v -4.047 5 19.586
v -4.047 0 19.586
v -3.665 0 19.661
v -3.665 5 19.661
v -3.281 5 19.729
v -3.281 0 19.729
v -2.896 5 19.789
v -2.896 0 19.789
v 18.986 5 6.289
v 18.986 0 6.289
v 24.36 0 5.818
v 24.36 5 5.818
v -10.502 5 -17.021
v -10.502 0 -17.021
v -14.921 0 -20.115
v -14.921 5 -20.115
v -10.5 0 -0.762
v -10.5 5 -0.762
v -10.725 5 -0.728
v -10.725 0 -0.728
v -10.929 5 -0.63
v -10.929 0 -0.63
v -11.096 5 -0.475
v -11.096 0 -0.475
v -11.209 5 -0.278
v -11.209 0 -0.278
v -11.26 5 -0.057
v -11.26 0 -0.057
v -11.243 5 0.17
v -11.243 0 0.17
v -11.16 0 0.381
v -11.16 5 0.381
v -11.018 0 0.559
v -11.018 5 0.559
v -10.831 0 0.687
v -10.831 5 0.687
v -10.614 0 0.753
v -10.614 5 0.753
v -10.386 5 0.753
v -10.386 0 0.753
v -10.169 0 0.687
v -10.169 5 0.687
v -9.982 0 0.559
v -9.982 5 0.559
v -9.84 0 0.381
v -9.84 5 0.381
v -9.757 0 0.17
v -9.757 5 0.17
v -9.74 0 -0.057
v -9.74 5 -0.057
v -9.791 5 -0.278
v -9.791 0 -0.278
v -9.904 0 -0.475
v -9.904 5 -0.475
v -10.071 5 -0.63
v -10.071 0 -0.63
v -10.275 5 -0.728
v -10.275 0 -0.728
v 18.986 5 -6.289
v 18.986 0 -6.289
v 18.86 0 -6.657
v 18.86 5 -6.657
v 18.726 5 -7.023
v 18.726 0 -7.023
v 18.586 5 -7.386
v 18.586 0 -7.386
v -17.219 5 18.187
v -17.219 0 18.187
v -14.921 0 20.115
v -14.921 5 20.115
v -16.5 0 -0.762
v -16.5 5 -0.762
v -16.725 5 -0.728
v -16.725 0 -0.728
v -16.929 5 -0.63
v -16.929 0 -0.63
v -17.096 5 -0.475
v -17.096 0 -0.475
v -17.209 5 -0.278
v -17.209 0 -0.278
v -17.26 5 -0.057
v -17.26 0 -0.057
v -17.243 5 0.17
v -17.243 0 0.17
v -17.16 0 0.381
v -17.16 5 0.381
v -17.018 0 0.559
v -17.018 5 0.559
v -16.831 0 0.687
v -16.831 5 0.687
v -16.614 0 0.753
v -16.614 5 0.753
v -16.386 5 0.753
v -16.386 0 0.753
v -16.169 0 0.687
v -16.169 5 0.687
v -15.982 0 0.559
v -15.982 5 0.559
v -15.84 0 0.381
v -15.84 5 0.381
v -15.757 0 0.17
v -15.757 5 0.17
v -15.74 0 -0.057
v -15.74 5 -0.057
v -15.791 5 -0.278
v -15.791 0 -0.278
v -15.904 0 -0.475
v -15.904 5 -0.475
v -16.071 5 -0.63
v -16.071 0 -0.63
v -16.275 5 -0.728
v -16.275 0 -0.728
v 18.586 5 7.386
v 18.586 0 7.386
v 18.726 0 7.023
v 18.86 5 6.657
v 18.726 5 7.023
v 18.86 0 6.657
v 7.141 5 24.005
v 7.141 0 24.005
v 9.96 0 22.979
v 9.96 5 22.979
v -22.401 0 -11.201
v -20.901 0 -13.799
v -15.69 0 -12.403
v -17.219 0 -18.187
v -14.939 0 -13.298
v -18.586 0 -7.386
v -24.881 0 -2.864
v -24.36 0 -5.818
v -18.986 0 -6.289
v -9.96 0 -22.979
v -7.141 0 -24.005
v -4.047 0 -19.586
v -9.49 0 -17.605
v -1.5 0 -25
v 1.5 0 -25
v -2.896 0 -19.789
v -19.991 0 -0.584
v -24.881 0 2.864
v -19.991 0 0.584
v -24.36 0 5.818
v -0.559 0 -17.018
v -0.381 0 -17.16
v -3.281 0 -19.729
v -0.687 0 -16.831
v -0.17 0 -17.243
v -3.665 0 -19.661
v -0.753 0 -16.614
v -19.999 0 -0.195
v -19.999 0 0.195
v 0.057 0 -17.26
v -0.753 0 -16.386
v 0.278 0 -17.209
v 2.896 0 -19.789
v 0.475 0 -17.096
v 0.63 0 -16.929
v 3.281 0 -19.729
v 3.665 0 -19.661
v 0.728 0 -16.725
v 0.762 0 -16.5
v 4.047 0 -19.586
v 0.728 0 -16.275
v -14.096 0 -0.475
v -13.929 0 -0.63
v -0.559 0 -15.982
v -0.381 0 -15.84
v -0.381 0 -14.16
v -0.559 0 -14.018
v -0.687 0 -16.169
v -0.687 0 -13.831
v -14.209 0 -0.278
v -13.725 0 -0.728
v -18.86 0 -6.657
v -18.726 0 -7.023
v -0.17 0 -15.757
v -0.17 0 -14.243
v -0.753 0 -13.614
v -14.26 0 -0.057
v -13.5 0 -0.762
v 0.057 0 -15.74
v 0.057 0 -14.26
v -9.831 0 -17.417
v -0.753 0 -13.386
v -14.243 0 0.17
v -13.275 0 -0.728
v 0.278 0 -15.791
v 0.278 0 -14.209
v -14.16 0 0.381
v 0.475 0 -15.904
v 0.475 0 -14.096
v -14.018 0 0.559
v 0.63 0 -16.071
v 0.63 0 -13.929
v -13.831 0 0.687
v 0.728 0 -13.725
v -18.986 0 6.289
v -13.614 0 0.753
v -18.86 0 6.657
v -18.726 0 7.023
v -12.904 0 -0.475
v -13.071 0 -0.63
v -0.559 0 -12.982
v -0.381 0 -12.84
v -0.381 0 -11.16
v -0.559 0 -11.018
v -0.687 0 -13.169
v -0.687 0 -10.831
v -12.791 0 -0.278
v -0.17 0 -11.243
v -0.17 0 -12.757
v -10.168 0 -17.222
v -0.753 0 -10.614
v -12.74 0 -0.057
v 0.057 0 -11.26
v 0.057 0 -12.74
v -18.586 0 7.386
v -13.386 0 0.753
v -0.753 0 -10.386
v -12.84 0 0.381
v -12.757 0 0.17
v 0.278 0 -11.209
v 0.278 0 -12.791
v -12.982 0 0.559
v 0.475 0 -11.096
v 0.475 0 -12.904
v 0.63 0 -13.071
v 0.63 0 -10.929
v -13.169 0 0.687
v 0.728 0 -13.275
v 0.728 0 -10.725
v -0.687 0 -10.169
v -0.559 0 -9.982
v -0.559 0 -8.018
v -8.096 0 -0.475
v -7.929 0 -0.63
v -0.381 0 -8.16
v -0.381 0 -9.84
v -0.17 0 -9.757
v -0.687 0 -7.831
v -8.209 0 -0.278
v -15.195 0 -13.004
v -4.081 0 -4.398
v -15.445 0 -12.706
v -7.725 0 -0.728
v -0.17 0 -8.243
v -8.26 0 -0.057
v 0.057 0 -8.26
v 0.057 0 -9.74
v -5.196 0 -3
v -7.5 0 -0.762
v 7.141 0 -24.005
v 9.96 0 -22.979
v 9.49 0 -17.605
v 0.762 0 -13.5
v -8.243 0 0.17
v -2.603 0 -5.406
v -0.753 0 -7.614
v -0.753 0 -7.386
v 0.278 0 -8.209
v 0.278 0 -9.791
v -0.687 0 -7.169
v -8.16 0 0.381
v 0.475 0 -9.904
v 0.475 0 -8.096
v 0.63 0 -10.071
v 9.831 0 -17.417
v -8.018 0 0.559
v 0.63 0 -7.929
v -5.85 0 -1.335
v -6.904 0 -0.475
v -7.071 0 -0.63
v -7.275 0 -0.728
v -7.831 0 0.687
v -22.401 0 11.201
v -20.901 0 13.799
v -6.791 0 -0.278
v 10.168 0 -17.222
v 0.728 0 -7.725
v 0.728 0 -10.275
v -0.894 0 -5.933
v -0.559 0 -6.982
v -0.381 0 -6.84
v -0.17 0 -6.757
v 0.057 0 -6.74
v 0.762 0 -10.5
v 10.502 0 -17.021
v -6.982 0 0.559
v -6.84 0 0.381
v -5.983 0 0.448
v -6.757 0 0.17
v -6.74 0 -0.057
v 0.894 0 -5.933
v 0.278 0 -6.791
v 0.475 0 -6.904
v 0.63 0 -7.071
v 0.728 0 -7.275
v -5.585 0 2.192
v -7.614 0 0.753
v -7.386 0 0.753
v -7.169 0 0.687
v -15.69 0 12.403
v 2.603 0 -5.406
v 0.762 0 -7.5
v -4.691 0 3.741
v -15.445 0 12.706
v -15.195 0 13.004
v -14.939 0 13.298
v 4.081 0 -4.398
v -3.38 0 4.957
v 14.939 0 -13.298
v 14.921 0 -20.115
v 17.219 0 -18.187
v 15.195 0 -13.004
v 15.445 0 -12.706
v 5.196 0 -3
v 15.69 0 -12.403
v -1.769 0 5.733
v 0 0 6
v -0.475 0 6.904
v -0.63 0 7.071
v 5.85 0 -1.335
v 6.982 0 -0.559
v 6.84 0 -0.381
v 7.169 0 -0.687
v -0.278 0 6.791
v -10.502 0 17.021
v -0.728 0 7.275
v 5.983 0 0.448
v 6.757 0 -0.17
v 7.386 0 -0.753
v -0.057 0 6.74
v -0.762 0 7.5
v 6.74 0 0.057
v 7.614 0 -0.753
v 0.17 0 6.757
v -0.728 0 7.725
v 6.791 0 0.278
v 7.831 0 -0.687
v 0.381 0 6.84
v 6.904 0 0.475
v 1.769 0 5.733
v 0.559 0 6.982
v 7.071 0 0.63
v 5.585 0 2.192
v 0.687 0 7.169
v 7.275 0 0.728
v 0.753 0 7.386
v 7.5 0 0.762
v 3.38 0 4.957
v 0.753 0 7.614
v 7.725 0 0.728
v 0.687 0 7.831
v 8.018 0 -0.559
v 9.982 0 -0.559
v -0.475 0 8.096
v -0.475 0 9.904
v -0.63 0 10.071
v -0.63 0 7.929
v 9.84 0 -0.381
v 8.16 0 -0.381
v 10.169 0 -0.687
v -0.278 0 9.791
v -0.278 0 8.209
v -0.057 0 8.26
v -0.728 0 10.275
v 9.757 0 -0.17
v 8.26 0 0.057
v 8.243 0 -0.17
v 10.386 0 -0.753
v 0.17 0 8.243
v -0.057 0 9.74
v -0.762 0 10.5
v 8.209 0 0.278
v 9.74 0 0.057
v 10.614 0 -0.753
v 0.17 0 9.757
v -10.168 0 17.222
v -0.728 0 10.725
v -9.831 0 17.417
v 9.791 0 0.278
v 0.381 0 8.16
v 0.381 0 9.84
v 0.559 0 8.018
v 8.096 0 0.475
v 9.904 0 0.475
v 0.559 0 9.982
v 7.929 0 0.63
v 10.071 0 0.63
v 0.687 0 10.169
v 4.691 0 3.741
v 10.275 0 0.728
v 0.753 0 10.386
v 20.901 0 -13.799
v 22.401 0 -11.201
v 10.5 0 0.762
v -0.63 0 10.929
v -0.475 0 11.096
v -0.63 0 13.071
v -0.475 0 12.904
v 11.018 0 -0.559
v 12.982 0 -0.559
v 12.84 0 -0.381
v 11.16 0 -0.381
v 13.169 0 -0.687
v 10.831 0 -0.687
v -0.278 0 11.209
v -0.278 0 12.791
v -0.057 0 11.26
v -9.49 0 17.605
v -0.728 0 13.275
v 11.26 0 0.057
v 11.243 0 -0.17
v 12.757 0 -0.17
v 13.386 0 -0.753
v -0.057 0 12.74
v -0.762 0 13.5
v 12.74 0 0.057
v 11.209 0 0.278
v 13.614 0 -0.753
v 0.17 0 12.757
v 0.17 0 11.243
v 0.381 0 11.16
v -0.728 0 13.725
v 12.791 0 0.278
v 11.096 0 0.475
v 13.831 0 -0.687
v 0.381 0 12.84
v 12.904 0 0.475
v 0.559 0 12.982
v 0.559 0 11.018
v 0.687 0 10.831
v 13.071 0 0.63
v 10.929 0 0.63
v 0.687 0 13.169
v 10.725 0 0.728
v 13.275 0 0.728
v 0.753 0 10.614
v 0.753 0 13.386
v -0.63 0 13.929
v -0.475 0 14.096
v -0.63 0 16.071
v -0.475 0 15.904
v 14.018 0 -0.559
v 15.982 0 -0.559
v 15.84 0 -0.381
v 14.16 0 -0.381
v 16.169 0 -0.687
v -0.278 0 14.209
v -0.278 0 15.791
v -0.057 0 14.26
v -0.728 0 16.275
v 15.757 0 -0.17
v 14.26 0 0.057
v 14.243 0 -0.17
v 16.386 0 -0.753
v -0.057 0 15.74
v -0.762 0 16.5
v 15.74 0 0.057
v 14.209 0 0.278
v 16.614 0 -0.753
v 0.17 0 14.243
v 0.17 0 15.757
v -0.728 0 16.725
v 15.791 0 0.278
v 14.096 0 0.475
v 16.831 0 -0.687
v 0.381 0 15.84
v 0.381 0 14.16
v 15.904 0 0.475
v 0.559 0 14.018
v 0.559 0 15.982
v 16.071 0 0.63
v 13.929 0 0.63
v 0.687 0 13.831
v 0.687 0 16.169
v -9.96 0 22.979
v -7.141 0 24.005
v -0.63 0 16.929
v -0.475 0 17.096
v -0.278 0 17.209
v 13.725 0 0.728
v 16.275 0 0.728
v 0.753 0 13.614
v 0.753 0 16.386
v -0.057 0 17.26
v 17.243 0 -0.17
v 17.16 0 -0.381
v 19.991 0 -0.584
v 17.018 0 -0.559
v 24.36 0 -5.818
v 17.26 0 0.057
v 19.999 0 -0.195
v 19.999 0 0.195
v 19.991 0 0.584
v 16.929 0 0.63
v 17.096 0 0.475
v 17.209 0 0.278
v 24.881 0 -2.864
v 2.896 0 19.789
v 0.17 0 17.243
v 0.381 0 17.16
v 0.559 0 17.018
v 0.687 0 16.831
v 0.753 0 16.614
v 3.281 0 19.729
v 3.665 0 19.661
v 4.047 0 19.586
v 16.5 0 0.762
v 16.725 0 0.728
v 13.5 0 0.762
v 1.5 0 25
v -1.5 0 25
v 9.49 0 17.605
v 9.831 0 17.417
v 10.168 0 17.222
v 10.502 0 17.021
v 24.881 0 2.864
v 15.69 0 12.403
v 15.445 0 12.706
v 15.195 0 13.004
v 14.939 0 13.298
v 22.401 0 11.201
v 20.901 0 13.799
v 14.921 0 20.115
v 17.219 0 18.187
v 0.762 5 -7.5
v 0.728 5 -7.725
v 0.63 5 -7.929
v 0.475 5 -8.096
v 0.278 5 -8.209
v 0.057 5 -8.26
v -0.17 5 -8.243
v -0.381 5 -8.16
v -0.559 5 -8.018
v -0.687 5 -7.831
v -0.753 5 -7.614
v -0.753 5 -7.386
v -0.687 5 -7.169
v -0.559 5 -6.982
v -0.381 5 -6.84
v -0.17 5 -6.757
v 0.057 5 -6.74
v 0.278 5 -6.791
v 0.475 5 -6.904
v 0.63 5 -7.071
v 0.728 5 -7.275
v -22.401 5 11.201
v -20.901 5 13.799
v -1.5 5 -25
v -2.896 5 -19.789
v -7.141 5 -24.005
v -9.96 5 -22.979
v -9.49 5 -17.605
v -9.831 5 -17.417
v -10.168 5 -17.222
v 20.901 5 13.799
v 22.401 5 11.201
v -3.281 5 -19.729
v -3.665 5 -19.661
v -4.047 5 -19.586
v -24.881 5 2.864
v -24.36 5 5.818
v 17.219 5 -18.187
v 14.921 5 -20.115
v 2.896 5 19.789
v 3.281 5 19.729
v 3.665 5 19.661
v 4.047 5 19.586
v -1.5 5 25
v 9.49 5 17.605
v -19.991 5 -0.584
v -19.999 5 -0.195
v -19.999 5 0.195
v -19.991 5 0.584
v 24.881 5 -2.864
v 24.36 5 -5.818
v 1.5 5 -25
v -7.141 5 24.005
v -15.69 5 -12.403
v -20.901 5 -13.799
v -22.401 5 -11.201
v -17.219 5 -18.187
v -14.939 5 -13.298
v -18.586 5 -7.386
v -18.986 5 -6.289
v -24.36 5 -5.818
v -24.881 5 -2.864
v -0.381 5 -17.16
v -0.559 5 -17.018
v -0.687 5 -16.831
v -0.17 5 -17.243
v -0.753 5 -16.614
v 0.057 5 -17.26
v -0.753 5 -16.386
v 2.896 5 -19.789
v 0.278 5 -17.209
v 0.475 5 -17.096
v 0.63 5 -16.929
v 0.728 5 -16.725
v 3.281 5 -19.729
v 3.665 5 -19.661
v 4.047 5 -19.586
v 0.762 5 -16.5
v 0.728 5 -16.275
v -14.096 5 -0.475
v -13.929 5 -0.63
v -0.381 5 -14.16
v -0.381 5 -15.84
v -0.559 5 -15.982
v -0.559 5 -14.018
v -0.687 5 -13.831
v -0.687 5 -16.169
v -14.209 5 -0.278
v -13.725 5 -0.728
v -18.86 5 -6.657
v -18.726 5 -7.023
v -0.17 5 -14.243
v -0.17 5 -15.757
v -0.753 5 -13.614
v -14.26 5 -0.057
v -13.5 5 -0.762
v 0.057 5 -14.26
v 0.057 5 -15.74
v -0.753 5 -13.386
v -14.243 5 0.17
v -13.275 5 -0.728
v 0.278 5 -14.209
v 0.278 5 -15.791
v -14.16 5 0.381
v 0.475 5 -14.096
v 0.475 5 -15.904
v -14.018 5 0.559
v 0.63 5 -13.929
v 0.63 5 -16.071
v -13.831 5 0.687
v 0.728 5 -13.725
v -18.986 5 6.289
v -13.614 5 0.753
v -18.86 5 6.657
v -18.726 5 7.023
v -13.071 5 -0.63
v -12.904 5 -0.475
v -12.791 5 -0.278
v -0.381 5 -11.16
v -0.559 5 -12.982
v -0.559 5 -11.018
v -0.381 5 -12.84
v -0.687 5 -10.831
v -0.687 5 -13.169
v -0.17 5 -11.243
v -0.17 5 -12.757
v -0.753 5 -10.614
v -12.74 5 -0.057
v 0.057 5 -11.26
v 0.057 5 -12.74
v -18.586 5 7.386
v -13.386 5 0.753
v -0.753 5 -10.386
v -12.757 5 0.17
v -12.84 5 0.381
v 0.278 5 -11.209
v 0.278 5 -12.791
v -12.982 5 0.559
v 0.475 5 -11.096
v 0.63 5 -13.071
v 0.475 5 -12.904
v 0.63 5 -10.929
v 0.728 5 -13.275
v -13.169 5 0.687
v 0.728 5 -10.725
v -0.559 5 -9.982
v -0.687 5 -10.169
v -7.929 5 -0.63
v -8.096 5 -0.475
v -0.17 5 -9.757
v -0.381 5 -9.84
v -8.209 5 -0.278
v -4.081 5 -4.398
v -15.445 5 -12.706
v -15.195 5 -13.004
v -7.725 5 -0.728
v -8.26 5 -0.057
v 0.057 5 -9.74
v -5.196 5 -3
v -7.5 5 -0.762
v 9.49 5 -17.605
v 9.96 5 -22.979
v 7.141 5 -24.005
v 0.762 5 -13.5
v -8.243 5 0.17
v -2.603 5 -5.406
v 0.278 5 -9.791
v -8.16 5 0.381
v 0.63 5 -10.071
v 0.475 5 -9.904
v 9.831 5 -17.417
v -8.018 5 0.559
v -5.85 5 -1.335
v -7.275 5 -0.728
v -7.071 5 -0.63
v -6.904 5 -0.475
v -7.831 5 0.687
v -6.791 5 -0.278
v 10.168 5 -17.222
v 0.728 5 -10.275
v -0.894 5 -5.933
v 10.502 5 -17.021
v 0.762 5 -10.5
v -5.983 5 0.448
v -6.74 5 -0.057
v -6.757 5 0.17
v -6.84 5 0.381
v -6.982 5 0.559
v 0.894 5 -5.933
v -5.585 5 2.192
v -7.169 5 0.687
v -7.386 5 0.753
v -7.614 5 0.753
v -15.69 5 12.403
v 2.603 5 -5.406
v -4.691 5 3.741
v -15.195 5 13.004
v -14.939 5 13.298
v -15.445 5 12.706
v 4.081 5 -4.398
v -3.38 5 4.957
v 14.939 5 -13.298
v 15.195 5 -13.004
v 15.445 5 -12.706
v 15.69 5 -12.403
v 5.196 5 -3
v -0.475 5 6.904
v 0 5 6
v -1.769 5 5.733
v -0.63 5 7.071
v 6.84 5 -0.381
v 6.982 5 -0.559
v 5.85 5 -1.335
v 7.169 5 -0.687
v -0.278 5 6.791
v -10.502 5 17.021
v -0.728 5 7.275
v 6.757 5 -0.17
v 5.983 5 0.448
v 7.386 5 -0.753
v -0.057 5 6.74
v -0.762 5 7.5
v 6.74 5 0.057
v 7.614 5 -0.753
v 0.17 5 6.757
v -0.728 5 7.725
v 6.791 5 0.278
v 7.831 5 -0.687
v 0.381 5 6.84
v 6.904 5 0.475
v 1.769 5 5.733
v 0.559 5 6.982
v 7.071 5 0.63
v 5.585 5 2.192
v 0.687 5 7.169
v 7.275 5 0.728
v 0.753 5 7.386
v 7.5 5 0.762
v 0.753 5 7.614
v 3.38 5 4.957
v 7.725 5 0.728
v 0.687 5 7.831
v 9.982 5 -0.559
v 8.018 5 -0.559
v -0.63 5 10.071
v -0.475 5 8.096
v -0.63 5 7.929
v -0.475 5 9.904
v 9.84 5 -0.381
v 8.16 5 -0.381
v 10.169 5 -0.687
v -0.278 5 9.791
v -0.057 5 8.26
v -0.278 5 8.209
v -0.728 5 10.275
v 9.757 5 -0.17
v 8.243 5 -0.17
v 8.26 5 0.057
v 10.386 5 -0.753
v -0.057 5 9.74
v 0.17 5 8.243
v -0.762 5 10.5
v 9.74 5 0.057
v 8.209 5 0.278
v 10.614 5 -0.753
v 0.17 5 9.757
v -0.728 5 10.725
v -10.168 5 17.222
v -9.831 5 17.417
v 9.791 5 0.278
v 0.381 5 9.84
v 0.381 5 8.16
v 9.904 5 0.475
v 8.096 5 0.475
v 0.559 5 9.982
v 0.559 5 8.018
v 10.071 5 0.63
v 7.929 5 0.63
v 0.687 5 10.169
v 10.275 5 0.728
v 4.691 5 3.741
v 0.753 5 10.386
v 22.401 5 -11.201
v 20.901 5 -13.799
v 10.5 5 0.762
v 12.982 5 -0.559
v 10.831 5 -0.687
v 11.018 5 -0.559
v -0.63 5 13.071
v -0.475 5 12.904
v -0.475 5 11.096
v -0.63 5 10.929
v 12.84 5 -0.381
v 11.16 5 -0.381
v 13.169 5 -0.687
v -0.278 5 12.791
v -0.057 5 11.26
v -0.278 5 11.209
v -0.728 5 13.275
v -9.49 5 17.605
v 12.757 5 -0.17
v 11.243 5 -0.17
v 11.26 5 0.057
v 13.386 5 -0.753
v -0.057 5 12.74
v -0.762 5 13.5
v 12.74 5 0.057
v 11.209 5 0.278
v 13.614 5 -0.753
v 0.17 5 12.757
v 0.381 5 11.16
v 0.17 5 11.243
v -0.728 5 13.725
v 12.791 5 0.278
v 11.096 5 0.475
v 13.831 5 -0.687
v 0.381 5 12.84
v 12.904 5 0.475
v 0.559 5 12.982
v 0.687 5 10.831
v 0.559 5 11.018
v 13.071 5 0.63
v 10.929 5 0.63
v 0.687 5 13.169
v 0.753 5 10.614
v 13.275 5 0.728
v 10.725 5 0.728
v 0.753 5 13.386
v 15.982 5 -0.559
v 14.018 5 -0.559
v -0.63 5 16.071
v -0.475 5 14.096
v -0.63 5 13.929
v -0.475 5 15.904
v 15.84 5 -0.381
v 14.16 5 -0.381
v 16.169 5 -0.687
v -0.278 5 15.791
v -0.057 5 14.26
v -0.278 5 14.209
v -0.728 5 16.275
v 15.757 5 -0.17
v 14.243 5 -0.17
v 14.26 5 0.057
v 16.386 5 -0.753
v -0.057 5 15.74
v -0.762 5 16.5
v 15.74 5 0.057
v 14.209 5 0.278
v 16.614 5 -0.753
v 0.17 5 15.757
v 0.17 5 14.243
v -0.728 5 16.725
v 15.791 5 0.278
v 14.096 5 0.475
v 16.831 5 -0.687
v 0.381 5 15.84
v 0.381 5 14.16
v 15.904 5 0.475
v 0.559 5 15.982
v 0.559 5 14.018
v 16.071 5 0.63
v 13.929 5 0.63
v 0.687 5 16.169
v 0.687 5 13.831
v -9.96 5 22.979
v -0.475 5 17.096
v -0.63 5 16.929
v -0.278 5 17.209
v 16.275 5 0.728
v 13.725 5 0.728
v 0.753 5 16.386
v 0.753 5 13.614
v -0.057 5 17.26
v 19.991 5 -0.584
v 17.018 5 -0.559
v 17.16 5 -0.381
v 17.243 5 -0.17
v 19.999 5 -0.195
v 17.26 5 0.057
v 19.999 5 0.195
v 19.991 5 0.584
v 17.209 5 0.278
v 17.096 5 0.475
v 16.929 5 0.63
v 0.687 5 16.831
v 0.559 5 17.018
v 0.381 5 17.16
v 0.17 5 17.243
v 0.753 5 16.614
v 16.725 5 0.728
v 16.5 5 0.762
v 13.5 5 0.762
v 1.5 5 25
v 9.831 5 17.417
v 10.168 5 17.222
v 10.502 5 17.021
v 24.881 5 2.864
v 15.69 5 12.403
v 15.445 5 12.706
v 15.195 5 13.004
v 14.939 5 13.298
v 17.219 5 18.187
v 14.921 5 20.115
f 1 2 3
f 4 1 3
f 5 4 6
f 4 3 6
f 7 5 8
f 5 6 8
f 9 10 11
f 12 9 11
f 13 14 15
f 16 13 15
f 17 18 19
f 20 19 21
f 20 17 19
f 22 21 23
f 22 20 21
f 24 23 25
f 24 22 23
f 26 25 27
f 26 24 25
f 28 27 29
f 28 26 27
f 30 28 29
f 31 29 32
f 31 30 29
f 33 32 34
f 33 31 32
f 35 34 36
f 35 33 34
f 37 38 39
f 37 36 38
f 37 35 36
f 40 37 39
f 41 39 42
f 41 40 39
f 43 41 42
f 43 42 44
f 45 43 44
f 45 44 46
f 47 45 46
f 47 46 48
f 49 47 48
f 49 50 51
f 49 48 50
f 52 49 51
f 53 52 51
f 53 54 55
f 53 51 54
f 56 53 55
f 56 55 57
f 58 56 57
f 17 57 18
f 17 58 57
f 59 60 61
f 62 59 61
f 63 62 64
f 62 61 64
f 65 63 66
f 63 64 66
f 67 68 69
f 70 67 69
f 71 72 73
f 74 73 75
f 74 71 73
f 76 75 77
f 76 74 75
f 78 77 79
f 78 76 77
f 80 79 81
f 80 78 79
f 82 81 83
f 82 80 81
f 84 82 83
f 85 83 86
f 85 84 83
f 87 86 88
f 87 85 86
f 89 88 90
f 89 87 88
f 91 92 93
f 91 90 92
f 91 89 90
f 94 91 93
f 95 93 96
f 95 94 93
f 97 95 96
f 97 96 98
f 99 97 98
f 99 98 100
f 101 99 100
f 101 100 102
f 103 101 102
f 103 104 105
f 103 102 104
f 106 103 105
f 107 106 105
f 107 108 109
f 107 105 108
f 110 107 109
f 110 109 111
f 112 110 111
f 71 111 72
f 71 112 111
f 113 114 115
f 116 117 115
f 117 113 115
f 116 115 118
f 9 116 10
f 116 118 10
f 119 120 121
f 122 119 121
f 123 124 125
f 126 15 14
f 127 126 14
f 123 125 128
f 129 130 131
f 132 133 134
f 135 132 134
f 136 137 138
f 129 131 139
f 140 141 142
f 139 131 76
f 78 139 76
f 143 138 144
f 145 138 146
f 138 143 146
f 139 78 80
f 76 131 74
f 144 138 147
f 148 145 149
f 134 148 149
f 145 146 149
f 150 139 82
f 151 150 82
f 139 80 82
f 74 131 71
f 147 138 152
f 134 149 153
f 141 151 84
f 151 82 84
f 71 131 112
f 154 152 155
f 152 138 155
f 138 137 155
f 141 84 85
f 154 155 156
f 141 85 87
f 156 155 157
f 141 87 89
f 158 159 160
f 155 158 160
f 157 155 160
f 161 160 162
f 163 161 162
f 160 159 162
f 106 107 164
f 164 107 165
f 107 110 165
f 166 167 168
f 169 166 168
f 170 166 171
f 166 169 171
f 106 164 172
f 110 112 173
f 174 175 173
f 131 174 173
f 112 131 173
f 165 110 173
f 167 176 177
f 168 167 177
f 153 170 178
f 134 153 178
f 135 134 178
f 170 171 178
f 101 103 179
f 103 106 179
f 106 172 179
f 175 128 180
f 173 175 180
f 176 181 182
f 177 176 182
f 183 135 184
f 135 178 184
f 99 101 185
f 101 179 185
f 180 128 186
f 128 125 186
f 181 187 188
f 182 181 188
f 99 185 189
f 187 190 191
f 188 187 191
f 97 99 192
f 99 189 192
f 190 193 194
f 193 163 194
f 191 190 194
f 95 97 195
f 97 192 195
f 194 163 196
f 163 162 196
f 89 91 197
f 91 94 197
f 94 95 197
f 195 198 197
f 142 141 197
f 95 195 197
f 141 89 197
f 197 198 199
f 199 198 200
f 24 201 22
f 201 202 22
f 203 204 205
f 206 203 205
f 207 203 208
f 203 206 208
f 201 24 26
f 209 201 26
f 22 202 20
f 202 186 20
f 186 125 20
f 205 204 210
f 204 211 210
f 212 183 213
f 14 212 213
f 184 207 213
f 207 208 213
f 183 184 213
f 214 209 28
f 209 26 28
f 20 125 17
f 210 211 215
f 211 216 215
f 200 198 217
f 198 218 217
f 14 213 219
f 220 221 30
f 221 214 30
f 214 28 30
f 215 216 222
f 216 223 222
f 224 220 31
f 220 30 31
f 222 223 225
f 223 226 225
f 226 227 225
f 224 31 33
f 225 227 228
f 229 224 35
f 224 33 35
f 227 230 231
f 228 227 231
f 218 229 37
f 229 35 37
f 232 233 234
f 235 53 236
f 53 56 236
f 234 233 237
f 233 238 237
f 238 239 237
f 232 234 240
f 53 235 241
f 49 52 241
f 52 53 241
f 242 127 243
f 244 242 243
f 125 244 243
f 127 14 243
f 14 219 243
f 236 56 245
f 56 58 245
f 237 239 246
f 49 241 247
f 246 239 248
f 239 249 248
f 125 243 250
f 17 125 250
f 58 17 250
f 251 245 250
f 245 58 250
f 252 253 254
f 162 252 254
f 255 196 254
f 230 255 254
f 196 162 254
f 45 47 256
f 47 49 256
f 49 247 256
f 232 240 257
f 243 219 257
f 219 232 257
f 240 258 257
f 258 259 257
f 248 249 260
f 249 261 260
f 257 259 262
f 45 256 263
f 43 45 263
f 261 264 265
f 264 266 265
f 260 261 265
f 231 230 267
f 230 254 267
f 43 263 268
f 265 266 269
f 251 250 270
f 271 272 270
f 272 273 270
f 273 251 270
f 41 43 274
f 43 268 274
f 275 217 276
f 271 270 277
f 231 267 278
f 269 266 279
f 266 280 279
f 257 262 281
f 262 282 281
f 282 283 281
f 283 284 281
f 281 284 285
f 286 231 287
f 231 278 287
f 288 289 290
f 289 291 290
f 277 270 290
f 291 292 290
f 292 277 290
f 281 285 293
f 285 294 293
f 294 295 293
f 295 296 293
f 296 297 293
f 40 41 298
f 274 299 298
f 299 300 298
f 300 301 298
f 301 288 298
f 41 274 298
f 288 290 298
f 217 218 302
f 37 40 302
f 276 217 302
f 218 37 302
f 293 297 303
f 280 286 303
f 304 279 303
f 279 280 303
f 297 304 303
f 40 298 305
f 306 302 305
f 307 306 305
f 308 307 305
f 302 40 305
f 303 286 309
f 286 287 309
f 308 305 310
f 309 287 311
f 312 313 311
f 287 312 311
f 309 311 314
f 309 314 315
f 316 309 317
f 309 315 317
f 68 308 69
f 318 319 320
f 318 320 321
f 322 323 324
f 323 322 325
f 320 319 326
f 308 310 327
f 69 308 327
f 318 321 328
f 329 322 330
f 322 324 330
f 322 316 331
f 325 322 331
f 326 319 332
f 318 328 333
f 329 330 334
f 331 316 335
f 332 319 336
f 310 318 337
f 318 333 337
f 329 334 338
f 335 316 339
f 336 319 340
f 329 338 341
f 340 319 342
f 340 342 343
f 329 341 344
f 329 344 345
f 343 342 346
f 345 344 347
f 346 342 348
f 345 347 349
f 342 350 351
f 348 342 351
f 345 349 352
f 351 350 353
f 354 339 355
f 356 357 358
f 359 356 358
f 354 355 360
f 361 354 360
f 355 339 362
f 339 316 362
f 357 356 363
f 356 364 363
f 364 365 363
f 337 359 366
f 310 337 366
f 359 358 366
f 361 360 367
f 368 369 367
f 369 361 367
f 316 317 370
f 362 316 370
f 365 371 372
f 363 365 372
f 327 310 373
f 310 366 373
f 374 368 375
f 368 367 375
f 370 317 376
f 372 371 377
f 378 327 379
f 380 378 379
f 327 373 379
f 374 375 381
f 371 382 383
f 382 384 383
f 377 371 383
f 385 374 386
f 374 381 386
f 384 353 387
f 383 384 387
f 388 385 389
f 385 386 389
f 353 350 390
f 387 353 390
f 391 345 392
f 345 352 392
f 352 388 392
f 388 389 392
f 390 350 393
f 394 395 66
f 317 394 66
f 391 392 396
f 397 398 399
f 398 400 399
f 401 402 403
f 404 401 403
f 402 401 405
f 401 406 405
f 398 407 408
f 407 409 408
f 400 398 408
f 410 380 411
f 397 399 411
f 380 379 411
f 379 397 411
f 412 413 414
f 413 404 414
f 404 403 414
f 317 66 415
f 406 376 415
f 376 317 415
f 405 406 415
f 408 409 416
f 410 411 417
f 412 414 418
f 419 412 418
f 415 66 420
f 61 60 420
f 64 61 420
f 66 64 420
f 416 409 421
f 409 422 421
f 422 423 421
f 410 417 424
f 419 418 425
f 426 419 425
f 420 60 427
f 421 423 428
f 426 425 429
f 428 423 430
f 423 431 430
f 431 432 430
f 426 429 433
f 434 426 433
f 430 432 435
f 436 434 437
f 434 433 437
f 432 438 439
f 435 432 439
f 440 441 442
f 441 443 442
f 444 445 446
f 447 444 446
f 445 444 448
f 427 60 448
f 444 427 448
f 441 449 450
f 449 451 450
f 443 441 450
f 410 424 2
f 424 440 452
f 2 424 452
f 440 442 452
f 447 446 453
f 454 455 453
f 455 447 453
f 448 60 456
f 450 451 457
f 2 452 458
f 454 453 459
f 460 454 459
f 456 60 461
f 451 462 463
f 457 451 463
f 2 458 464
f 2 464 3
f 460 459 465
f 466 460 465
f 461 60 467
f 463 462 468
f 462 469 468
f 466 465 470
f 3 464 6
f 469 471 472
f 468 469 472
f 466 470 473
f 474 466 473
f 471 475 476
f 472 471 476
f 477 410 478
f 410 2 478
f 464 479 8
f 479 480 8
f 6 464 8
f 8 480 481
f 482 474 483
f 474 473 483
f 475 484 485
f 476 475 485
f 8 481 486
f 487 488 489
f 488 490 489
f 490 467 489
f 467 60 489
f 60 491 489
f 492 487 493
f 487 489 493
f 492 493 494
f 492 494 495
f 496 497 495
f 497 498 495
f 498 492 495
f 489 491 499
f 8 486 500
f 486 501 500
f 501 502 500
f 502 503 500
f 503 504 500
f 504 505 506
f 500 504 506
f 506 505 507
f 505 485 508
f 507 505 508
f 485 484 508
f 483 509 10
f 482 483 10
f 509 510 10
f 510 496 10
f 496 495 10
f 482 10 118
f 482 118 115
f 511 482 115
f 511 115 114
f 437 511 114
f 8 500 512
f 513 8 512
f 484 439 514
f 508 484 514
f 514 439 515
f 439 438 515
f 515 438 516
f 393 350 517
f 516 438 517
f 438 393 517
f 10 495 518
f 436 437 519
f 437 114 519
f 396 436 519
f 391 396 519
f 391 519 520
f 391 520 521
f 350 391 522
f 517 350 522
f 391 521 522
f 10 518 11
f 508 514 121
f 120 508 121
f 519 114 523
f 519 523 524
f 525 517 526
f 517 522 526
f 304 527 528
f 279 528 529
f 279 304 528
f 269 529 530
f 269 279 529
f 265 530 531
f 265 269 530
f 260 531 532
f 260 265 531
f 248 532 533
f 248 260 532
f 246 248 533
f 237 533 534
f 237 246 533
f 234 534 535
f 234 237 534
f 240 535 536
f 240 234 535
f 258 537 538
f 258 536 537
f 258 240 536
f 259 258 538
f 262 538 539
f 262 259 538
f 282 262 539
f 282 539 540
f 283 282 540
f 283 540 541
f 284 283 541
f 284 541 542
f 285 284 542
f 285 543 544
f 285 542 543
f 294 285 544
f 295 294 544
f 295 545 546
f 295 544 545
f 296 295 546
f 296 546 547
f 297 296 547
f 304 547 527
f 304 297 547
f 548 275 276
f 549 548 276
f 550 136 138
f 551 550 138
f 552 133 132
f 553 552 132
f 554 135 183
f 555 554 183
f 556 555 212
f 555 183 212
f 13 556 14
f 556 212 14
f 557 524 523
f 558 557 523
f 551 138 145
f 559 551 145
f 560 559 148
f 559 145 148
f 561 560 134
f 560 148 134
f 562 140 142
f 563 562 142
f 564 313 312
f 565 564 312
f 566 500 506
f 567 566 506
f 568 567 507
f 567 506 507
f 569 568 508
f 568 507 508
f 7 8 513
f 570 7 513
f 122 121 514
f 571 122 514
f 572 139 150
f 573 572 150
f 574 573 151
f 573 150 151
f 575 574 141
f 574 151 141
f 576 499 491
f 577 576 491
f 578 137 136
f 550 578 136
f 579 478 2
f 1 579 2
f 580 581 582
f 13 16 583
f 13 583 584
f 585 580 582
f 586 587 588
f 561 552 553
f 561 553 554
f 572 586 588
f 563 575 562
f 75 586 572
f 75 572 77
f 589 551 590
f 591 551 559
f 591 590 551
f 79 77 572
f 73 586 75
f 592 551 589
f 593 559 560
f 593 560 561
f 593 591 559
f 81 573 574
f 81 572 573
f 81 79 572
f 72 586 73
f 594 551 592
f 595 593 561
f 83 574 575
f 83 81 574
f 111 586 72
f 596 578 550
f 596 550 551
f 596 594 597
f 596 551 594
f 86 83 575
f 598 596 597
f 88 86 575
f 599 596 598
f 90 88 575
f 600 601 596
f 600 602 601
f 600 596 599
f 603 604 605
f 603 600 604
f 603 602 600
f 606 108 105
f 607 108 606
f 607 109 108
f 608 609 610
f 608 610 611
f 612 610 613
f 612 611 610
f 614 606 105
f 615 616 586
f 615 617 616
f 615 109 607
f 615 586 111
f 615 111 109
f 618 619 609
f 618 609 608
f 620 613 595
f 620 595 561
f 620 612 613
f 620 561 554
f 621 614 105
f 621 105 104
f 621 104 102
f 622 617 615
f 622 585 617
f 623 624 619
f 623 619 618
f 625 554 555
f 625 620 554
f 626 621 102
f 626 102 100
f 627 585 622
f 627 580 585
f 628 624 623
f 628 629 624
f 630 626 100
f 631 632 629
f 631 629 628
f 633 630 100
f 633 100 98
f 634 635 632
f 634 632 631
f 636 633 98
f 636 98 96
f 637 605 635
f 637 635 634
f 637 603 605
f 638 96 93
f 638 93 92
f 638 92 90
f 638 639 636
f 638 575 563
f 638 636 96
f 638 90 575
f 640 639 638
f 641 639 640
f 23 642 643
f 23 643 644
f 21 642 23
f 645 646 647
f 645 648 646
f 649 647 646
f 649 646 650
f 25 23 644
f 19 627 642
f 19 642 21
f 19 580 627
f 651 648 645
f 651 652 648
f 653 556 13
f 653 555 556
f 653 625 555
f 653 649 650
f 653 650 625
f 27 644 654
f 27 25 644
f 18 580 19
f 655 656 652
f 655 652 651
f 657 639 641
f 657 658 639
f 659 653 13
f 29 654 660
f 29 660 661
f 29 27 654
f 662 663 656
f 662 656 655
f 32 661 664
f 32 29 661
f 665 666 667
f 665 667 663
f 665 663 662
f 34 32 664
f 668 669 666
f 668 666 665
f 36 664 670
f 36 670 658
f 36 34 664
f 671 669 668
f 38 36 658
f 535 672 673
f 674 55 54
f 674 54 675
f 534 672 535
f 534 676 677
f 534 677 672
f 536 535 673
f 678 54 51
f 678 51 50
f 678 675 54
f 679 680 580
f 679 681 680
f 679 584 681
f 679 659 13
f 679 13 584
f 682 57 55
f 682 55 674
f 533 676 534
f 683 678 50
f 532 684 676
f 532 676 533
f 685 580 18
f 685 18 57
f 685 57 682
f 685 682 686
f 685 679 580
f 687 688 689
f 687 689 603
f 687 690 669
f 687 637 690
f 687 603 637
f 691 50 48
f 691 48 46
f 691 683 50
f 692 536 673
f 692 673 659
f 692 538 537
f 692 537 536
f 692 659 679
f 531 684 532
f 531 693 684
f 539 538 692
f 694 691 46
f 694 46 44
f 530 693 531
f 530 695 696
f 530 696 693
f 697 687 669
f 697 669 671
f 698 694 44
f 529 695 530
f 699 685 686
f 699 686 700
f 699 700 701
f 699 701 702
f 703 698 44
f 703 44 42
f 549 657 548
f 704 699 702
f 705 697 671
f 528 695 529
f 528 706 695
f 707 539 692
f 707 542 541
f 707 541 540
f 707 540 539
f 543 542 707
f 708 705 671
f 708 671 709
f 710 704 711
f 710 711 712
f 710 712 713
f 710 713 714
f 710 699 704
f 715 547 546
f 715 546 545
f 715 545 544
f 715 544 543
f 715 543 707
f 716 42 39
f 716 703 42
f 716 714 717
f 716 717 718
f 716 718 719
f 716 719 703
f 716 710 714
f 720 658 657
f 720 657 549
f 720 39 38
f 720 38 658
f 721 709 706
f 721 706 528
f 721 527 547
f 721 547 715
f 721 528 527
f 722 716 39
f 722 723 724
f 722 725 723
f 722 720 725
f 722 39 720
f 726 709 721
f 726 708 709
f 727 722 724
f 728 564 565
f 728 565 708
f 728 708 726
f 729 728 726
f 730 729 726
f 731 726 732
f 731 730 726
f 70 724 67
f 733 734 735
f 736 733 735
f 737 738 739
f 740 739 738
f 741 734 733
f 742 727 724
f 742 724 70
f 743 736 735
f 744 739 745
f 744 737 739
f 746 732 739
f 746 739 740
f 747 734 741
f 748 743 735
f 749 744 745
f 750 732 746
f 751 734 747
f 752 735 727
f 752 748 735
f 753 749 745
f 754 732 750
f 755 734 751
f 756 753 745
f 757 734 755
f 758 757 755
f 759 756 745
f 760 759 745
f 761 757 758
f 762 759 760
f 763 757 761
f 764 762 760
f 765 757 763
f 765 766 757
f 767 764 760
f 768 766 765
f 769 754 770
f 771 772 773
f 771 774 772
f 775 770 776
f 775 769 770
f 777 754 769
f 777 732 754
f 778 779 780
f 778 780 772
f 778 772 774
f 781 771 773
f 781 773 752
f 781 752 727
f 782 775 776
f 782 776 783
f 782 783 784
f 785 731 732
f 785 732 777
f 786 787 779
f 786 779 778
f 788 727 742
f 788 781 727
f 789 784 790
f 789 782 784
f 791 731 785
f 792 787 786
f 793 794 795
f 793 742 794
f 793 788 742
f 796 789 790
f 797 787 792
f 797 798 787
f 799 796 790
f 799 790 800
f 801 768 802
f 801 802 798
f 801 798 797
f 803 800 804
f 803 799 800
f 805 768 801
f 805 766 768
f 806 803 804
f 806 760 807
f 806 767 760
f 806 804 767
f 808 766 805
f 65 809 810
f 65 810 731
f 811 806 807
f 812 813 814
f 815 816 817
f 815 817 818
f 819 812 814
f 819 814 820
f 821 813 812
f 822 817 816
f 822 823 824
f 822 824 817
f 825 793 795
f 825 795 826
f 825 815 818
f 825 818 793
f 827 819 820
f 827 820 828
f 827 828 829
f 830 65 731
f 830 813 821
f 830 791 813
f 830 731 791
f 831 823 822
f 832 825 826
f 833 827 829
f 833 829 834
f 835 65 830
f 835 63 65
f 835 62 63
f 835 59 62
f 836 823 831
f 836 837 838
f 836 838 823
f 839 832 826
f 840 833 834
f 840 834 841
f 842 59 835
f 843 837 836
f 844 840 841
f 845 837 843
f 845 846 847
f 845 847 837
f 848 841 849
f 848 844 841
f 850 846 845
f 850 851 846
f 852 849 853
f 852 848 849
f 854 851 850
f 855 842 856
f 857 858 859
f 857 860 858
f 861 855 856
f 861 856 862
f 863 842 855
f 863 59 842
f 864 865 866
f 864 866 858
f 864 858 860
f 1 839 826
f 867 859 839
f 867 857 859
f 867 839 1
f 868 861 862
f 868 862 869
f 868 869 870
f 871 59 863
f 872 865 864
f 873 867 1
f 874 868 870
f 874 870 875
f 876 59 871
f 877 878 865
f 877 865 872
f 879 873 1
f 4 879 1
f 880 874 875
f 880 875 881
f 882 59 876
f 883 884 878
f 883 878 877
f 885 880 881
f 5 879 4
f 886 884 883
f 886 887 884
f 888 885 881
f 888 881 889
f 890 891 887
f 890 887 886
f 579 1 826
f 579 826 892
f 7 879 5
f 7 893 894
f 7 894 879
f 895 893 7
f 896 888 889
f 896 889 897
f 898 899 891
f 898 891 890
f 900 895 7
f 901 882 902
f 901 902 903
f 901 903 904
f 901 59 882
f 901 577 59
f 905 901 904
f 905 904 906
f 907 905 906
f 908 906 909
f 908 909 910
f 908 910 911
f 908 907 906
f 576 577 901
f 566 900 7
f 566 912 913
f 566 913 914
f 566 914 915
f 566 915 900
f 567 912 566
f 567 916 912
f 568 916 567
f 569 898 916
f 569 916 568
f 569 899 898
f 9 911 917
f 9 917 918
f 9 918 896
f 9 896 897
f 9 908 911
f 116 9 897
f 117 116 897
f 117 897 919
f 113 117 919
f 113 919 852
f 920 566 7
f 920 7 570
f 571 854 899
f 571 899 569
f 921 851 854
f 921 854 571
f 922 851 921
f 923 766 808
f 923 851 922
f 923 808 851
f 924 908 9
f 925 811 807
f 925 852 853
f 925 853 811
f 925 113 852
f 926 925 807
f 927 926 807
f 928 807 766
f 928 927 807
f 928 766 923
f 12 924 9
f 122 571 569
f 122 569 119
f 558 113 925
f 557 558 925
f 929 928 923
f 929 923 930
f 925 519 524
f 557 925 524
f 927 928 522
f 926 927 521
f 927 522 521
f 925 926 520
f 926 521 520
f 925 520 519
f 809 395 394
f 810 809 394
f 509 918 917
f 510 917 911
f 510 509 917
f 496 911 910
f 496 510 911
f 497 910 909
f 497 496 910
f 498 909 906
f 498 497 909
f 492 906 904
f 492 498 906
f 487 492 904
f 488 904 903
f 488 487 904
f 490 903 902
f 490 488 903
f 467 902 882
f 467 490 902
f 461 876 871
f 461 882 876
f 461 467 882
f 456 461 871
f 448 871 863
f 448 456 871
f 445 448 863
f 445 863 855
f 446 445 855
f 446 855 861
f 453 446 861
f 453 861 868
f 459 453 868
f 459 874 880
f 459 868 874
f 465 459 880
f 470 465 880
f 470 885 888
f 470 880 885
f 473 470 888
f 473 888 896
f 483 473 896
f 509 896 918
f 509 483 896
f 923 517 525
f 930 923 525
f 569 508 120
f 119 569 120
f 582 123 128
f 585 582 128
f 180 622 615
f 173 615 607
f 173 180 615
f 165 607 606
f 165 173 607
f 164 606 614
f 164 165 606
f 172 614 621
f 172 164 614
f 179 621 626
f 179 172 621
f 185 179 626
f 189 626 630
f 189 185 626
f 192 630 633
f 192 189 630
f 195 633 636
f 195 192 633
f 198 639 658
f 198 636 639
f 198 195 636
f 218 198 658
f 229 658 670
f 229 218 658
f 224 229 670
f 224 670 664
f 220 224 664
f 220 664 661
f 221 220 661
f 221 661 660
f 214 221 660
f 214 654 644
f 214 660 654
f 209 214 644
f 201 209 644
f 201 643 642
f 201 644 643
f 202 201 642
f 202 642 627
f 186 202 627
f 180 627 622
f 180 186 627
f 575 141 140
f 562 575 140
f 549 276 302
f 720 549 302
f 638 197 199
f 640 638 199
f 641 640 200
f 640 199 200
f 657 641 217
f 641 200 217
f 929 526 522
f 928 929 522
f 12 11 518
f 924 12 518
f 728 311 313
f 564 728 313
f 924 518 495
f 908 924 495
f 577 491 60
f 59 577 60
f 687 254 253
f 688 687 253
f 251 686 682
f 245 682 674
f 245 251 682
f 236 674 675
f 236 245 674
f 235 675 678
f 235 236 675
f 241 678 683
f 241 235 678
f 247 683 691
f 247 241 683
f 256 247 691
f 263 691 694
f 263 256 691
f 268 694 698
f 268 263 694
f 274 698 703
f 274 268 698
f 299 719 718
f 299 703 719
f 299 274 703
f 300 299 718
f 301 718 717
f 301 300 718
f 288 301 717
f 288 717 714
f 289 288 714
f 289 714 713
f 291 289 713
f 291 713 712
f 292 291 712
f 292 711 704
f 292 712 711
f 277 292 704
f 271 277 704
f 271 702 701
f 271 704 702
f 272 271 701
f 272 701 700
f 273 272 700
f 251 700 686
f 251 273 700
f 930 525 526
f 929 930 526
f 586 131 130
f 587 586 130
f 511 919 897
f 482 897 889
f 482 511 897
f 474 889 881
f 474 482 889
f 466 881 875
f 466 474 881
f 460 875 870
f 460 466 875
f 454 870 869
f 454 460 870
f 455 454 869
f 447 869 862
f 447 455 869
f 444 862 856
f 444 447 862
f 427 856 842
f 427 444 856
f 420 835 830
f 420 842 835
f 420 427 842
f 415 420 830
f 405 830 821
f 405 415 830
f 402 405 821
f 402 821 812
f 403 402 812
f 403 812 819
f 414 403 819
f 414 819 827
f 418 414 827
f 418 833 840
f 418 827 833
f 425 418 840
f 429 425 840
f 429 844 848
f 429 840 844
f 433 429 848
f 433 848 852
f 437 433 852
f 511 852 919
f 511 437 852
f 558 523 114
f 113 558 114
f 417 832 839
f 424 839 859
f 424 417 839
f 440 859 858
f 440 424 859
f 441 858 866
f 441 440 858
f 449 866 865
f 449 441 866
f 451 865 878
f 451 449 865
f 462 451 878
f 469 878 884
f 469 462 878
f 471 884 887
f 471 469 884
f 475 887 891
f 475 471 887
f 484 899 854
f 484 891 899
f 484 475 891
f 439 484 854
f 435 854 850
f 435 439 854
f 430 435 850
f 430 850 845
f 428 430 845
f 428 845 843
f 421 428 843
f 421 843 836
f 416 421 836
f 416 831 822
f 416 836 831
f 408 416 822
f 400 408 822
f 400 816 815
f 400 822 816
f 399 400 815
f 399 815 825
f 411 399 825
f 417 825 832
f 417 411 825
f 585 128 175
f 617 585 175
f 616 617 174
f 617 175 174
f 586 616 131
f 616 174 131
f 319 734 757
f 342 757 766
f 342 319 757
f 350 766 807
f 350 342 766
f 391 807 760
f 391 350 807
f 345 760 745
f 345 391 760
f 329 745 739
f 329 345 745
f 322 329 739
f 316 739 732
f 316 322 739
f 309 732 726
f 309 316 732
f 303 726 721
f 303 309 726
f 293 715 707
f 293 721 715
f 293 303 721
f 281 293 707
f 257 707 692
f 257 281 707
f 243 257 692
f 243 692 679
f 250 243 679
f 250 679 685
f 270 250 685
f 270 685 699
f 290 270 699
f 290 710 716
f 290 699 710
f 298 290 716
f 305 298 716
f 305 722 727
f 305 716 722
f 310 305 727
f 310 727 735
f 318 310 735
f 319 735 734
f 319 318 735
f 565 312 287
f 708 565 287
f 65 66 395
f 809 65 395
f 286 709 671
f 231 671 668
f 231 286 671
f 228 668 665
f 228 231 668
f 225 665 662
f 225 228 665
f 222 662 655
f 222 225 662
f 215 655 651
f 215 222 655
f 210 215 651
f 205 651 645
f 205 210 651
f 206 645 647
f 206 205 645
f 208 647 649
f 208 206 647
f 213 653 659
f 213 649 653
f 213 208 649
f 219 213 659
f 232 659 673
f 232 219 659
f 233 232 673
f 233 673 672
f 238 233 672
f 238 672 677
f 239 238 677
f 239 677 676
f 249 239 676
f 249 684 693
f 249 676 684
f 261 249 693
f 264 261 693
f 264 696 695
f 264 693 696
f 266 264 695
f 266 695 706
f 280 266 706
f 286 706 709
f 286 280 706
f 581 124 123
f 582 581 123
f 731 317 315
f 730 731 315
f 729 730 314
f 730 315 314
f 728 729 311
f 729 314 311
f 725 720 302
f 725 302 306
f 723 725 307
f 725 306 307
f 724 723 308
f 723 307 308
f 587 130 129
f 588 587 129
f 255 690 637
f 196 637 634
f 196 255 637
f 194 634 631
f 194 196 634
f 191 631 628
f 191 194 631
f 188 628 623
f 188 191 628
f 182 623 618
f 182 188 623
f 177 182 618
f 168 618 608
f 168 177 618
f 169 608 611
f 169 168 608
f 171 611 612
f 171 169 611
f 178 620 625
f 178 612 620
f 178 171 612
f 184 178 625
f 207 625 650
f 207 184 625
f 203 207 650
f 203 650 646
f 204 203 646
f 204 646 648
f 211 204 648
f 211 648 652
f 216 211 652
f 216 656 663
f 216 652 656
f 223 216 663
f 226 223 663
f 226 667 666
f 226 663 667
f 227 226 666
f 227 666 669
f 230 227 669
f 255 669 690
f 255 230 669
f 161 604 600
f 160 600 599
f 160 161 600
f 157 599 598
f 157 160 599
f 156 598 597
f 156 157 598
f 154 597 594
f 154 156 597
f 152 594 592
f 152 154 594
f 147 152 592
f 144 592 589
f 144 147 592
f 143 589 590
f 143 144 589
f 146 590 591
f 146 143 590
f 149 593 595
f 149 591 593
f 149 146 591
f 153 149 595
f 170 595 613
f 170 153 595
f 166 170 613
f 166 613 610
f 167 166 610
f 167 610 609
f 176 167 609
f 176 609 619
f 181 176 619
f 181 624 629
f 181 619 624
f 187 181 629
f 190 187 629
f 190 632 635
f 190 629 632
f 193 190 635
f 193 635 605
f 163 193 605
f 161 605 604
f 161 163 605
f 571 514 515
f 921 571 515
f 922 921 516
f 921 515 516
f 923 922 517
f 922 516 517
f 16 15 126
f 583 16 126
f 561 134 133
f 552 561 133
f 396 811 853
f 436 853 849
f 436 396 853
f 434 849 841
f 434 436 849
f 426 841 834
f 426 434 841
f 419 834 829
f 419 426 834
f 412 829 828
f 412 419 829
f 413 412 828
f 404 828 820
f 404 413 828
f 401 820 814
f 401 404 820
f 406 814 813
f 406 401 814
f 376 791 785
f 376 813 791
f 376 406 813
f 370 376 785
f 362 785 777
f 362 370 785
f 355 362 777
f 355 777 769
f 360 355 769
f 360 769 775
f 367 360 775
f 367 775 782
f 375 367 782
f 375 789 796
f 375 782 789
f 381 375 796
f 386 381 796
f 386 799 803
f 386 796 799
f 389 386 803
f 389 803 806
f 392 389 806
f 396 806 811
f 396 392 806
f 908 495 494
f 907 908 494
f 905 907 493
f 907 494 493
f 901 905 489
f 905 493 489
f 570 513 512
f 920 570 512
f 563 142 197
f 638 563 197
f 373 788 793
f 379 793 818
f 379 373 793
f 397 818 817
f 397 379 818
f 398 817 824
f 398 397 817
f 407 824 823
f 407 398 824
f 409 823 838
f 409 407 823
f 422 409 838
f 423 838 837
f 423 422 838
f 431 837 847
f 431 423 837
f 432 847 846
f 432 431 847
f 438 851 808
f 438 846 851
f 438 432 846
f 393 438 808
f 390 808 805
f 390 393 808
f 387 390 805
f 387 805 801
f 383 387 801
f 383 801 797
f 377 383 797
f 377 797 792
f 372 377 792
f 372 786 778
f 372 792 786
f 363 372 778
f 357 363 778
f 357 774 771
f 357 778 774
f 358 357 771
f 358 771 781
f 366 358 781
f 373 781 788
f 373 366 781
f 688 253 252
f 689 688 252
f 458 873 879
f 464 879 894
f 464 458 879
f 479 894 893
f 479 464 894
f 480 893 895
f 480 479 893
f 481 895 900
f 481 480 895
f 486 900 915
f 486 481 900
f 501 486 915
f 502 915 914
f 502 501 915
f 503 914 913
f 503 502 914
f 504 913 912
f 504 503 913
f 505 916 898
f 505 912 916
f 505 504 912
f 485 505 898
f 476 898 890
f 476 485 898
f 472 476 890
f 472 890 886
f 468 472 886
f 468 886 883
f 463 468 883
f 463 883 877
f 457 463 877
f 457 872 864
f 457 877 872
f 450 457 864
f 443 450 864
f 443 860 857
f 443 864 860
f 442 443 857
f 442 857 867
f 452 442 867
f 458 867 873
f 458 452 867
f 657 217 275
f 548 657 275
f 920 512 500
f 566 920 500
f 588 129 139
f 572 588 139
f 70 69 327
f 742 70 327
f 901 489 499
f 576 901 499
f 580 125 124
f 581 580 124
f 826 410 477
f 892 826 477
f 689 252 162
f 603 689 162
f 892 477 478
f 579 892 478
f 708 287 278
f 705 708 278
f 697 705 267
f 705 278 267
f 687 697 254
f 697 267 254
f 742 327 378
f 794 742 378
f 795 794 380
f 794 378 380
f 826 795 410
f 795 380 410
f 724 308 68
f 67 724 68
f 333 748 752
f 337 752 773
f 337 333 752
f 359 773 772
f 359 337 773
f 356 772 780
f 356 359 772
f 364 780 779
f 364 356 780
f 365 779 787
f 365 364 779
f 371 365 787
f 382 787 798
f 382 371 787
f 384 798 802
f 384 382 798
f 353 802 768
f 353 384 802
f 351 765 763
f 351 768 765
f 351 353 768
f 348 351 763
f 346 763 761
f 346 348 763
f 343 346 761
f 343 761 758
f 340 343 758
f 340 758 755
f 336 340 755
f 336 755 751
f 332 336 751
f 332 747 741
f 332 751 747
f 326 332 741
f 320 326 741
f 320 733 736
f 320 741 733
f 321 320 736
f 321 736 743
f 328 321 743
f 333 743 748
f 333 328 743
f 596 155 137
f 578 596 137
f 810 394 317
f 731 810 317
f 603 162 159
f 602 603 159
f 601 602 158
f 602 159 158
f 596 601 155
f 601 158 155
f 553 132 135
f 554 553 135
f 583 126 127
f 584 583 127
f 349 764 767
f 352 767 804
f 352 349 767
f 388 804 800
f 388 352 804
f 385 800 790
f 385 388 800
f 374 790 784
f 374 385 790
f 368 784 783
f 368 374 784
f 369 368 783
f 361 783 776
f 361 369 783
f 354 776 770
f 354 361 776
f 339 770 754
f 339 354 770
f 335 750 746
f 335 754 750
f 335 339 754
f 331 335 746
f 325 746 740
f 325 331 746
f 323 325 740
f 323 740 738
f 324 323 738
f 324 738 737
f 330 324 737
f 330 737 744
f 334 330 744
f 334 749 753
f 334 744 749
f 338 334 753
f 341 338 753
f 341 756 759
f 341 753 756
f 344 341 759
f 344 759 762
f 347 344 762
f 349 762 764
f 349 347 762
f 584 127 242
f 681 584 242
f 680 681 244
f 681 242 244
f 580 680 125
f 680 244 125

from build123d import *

# Parameters (mm, degrees)
SKETCH2_R           = 20
BOSS_EXTRUDE1_DEPTH = 5
BOSS_EXTRUDE2_DEPTH = 5
CIRPATTERN1_COUNT   = 18
SKETCH3_R           = 6
SKETCH3_R_2         = 0.762
CUT_EXTRUDE1_DEPTH  = 36.623693592
CIRPATTERN2_COUNT   = 4


with BuildPart() as part:
    # Sketch2 → Boss-Extrude1 (new body)
    with BuildSketch(Plane(origin=(0, 0, 0), x_dir=(1, 0, 0), z_dir=(0, 1, 0))):
        Circle(SKETCH2_R)
    extrude(amount=BOSS_EXTRUDE1_DEPTH)

    # Sketch2<3> → Boss-Extrude2 (add)
    with BuildSketch(Plane(origin=(0, 0, 0), x_dir=(1, 0, 0), z_dir=(0, 1, 0))):
        with BuildLine():
            ThreePointArc((-2.896233759, 19.789184673), (0, 20), (2.896233759, 19.789184673))
            Line((2.896233759, 19.789184673), (1.5, 25))
            Line((1.5, 25), (-1.5, 25))
            Line((-1.5, 25), (-2.896233759, 19.789184673))
        make_face()
    boss_extrude2 = extrude(amount=BOSS_EXTRUDE2_DEPTH)

    # CirPattern1: Boss-Extrude2 ×18 about axis
    cirpattern1_axis = Axis((0, 5, 0), (0, -1, 0))
    for i in range(1, CIRPATTERN1_COUNT):
        add(boss_extrude2.rotate(cirpattern1_axis, i * 360 / CIRPATTERN1_COUNT))

    # Sketch3 → Cut-Extrude1 (cut, through all)
    with BuildSketch(Plane(origin=(0, 0, 0), x_dir=(1, 0, 0), z_dir=(0, 1, 0))):
        Circle(SKETCH3_R)
        with Locations((7.5, 0)):
            Circle(SKETCH3_R_2)
        with Locations((10.5, 0)):
            Circle(SKETCH3_R_2)
        with Locations((13.5, 0)):
            Circle(SKETCH3_R_2)
        with Locations((16.5, 0)):
            Circle(SKETCH3_R_2)
    cut_extrude1 = extrude(amount=CUT_EXTRUDE1_DEPTH, mode=Mode.SUBTRACT)

    # CirPattern2: Cut-Extrude1 ×4 about axis
    cirpattern2_axis = Axis((0, 5, 0), (0, -1, 0))
    for i in range(1, CIRPATTERN2_COUNT):
        add(cut_extrude1.rotate(cirpattern2_axis, i * 360 / CIRPATTERN2_COUNT), mode=Mode.SUBTRACT)


solid = part.part
